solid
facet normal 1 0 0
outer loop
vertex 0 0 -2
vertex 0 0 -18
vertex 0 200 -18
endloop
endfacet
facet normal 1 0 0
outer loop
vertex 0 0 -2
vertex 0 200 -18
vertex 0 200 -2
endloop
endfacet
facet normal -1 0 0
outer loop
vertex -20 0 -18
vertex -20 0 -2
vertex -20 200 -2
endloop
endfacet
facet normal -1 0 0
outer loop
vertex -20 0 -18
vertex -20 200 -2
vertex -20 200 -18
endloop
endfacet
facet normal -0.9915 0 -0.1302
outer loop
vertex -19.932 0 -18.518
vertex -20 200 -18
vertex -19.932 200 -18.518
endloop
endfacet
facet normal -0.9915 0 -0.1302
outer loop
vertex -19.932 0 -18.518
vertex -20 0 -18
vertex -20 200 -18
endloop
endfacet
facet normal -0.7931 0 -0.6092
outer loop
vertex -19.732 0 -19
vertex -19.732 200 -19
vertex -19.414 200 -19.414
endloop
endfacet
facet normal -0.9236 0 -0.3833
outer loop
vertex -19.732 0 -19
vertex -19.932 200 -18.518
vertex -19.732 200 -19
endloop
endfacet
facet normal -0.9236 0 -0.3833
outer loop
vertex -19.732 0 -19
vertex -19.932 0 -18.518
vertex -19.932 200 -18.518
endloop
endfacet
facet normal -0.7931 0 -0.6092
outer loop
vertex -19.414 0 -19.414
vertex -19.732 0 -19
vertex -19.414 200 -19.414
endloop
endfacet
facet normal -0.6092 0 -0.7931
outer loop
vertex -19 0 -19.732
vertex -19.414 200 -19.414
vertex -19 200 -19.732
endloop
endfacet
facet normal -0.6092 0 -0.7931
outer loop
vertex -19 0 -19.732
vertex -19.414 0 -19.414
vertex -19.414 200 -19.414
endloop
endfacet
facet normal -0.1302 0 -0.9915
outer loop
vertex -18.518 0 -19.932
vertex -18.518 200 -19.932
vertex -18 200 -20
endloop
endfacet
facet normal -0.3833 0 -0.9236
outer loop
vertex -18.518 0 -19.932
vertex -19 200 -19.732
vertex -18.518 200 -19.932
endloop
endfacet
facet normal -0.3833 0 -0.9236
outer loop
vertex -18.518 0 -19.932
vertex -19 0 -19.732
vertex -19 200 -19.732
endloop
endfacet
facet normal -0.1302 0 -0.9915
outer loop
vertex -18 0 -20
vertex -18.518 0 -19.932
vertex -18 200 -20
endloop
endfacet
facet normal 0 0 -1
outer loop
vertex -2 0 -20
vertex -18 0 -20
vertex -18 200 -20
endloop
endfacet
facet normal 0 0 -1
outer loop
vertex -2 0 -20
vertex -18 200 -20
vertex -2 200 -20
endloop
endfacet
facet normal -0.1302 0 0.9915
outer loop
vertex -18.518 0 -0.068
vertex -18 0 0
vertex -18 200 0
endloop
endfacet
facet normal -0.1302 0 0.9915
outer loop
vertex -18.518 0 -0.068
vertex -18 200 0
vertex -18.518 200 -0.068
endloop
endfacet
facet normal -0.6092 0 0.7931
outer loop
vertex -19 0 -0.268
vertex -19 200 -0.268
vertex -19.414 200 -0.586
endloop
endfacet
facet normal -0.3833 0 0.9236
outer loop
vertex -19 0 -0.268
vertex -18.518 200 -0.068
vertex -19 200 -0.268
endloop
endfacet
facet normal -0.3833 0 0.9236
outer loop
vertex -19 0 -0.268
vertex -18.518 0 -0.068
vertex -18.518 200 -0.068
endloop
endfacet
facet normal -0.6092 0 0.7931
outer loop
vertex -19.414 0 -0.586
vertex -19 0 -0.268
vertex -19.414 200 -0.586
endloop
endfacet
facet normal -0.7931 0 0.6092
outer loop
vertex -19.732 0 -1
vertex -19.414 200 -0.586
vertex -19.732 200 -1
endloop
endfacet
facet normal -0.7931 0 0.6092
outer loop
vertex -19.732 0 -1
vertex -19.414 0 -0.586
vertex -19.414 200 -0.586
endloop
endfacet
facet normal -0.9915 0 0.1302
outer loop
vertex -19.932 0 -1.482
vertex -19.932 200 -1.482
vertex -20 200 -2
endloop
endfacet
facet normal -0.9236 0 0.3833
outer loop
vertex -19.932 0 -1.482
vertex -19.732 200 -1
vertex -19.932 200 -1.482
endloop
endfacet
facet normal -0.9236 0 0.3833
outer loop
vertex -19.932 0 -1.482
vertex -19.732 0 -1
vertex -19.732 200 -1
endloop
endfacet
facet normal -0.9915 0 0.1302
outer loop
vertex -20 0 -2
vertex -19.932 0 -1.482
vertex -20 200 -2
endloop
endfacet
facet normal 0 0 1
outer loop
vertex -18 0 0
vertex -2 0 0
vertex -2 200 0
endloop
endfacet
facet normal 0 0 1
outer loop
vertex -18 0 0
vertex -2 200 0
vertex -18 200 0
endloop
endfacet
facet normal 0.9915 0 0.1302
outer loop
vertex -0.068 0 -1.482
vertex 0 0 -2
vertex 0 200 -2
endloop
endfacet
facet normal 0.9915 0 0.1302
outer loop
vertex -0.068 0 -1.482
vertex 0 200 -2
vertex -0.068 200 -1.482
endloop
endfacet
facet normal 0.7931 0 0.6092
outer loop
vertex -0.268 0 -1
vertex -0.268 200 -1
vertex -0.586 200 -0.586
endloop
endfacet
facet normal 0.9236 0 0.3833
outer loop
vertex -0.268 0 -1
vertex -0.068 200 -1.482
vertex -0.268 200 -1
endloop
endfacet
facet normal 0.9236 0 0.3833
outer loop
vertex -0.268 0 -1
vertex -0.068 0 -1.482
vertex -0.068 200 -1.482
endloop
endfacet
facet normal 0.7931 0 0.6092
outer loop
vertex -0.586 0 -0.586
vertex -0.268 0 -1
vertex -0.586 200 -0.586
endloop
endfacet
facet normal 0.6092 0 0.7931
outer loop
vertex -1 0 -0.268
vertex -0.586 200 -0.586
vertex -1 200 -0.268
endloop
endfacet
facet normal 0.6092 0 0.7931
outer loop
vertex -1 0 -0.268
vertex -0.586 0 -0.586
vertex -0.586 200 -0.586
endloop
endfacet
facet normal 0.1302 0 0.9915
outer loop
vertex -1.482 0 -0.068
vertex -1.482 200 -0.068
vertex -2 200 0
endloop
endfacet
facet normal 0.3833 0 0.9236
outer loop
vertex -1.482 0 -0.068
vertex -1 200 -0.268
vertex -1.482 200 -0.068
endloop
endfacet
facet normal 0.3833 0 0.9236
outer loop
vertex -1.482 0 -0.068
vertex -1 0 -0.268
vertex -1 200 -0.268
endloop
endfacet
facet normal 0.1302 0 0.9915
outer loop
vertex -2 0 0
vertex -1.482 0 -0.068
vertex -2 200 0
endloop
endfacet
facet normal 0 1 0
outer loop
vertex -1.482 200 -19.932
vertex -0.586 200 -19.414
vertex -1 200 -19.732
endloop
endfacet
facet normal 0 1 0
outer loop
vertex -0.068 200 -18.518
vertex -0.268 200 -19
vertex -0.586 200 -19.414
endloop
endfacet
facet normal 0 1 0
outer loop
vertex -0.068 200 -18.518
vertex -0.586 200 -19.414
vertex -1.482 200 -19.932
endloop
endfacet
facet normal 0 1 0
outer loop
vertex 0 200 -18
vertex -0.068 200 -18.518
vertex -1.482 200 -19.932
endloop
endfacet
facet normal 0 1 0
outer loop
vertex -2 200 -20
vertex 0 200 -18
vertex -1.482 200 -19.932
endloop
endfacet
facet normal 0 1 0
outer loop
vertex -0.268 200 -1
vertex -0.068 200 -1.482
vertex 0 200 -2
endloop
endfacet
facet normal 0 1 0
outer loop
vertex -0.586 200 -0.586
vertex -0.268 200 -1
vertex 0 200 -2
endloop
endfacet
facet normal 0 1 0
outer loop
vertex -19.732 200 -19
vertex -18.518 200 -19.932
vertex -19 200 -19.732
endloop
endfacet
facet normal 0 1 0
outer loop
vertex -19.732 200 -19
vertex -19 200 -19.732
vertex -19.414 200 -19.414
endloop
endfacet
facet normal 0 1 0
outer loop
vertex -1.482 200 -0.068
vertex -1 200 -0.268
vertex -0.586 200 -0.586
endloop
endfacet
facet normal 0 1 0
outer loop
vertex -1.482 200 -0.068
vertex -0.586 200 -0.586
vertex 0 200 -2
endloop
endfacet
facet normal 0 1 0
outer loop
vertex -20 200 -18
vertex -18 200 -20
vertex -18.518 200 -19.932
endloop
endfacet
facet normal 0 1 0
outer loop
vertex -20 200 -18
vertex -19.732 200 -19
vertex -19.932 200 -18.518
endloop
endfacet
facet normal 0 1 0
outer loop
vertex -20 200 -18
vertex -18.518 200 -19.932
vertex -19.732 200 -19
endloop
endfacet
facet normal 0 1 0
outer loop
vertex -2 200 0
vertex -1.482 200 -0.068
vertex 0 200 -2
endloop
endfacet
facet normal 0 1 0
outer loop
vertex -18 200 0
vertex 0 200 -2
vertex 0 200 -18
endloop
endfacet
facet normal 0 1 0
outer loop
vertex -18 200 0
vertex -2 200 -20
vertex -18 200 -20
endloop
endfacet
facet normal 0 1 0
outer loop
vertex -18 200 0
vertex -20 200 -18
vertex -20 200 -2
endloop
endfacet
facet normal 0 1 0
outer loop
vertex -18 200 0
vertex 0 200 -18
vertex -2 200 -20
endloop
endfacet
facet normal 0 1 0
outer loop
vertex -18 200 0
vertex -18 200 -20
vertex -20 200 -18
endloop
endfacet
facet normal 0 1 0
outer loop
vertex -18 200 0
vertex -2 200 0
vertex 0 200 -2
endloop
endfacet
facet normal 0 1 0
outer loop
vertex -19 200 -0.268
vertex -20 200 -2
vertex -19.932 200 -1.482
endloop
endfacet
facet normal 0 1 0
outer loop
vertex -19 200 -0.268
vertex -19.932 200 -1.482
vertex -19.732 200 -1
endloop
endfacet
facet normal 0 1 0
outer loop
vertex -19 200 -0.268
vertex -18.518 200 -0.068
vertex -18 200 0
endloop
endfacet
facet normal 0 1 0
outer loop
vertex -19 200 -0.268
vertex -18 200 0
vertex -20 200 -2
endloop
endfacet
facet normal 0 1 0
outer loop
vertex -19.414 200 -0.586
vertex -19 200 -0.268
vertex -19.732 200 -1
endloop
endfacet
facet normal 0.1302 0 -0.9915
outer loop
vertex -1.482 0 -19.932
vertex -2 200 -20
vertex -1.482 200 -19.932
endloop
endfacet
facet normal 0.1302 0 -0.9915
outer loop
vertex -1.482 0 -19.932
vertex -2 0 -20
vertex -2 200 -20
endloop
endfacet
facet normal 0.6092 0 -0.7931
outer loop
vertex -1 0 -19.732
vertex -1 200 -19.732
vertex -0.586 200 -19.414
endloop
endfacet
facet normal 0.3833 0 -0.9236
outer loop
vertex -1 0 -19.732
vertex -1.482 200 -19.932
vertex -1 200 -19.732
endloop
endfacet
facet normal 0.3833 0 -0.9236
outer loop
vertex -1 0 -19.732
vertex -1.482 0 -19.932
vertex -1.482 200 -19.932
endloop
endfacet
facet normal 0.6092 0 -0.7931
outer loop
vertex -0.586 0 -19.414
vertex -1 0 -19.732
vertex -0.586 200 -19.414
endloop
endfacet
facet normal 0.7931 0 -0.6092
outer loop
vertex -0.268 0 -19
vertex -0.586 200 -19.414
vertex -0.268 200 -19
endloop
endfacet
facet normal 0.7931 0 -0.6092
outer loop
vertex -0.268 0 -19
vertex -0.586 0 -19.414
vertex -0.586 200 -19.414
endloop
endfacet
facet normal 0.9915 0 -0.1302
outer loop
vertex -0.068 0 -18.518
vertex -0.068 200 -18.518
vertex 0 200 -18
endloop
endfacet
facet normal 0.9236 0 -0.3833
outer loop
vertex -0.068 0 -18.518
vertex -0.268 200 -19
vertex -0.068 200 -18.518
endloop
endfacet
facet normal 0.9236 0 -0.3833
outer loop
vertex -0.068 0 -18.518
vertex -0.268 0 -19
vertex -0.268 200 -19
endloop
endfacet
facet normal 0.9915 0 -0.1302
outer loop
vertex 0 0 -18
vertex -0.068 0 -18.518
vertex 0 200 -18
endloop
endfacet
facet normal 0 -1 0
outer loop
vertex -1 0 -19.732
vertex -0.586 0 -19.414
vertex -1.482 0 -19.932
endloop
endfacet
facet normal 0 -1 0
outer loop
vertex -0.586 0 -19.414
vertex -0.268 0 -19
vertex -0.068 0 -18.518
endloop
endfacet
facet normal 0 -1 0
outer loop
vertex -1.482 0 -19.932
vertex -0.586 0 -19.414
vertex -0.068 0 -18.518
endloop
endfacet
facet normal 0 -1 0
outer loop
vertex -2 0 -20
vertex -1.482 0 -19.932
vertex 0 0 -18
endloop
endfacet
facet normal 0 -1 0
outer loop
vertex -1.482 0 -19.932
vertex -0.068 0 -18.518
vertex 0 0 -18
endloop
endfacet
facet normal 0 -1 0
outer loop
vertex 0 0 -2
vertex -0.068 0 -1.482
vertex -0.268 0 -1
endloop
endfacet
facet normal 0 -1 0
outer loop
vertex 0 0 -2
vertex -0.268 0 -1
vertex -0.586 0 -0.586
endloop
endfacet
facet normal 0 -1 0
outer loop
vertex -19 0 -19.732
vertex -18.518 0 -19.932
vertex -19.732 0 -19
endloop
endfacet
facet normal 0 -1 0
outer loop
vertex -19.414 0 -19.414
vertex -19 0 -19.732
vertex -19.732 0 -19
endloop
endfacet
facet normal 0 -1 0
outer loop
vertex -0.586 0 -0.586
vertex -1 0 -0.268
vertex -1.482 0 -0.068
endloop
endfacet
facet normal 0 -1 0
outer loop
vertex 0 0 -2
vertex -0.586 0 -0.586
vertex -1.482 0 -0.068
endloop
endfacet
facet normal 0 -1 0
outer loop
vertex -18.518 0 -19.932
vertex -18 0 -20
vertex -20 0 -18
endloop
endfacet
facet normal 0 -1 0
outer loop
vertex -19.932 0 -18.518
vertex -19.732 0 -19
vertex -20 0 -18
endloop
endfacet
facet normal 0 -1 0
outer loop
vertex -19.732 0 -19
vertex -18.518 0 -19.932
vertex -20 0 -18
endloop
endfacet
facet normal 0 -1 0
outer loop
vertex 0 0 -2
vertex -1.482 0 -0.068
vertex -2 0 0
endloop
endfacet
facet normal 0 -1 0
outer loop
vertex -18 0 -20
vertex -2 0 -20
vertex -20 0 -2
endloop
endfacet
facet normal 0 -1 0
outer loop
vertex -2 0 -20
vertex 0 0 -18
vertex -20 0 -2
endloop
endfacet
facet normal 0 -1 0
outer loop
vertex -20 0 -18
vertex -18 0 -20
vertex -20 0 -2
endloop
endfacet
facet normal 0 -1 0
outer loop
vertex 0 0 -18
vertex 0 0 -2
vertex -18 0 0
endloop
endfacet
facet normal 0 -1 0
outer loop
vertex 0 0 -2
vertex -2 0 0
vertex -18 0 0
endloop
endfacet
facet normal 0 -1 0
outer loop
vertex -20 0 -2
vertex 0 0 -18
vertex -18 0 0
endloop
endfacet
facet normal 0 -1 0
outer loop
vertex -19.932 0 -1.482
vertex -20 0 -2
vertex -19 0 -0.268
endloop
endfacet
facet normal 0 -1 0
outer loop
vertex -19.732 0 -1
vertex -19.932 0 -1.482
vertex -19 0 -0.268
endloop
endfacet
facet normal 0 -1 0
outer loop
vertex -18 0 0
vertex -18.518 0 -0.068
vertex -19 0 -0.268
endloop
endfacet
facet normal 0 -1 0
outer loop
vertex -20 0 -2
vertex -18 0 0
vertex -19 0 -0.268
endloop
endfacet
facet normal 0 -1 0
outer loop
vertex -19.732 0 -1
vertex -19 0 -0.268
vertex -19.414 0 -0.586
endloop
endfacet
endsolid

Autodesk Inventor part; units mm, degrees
ref_plane "YZ Plane" through (0, 0, 0) normal (1, 0, 0) x (0, 1, 0)
ref_plane "XZ Plane" through (0, 0, 0) normal (0, 1, 0) x (-1, 0, 0)
ref_plane "XY Plane" through (0, 0, 0) normal (0, 0, 1) x (1, 0, 0)
sketch "Sketch1" plane through (0, 0, 0) normal (0, 1, 0) x (-1, 0, 0)
  line L0 (2, 0) -> (18, 0)
  line L1 (20, -2) -> (20, -18)
  line L2 (18, -20) -> (2, -20)
  line L3 (0, -18) -> (0, -2)
  arc A0 (20, -2) -> (18, 0) centre (18, -2) ccw
  arc A1 (2, 0) -> (0, -2) centre (2, -2) ccw
  arc A2 (0, -18) -> (2, -20) centre (2, -18) ccw
  arc A3 (18, -20) -> (20, -18) centre (18, -18) ccw
  point P0 (0, 0)
  point P1 (20, -20)
  point P2 (20, 0)
  point P3 (0, -20)
  dimension "d0" = 20
  dimension "d1" = 20
  dimension "d4" = 2
extrude "Extrusion1" add sketch "Sketch1" along normal blind 200
properties part number "MagnetShaft"
